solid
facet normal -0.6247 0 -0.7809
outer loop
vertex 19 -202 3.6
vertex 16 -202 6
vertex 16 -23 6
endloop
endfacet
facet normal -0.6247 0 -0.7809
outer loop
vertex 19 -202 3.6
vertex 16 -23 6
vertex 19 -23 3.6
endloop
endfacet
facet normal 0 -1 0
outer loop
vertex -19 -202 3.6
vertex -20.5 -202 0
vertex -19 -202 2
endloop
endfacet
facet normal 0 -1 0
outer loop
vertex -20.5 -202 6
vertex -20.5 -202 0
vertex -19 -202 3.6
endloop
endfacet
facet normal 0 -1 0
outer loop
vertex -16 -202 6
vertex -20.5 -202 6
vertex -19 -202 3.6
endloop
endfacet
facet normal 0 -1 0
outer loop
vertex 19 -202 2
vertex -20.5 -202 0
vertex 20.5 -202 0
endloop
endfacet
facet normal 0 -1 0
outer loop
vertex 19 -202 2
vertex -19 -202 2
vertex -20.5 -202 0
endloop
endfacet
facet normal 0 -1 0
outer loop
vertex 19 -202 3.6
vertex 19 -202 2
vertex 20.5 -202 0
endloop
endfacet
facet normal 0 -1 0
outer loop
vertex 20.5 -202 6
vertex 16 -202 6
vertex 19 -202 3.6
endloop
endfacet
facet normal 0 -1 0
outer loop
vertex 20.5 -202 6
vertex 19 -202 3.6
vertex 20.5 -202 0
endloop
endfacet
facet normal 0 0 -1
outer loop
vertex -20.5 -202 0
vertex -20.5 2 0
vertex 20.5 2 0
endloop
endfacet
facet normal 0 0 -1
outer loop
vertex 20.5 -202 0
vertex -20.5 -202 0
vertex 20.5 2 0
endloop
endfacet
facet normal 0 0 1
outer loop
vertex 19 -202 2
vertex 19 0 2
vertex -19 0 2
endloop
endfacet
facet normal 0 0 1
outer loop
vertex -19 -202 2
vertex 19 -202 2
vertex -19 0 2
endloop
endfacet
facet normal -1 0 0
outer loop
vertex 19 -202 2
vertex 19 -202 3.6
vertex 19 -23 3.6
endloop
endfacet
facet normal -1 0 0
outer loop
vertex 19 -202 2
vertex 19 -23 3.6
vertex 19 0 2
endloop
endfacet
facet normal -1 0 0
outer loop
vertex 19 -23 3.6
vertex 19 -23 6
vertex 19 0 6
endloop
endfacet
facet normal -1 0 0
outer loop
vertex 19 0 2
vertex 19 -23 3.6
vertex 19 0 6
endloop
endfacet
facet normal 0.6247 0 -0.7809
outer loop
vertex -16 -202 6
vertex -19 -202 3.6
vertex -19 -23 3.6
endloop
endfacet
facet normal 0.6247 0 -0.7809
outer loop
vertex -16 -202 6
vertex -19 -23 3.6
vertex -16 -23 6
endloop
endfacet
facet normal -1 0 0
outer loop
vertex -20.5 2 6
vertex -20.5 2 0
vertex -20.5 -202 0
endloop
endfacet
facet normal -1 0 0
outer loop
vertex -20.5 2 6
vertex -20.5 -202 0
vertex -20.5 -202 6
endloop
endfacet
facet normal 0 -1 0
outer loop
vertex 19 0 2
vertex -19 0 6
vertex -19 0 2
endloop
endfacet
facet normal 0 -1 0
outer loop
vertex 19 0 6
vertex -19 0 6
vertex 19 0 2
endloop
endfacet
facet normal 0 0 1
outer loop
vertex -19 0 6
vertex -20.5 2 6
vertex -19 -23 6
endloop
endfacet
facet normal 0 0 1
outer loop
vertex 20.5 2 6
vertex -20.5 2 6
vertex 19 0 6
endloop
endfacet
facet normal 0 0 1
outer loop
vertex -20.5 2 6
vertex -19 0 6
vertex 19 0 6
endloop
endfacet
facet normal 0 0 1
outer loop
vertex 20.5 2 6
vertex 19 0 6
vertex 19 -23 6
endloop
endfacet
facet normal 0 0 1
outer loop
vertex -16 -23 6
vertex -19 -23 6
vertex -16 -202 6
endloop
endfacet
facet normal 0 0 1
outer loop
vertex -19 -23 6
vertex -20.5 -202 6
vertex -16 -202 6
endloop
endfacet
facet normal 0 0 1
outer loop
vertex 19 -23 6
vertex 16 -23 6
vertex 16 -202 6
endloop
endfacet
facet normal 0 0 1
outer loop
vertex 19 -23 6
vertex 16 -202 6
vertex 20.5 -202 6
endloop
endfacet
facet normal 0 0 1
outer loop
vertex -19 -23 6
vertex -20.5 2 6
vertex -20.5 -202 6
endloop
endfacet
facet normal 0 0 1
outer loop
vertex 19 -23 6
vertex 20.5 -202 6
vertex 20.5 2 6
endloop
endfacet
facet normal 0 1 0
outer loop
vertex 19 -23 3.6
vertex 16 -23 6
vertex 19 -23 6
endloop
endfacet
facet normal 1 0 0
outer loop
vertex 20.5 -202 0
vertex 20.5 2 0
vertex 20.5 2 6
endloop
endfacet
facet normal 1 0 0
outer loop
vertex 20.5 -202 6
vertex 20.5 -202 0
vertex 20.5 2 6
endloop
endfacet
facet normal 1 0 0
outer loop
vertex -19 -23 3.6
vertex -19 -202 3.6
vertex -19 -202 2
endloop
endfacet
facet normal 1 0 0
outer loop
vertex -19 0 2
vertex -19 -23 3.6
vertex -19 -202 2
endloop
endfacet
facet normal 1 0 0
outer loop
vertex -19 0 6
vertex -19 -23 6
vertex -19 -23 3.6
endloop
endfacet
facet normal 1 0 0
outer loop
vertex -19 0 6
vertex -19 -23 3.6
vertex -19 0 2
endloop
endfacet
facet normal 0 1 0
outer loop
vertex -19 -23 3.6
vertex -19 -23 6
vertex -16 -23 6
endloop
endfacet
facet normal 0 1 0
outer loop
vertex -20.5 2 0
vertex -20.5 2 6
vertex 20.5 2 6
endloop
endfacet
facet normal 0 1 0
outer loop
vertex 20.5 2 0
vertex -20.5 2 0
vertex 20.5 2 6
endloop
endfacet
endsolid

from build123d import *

# Parameters (mm, degrees)
F1_DEPTH = 202
F2_W     = 41
F2_H     = 6
F3_DEPTH = 2
F5_W     = 38
F5_H     = 23
F6_DEPTH = 4


with BuildPart() as f1:
    # F0 (on Front) → F1 (new body)
    with BuildSketch(Plane.XZ):
        Polygon((-20.5, 6), (-20.5, 0), (20.5, 0), (20.5, 6), (16, 6), (19, 3.6), (19, 2), (-19, 2), (-19, 3.6), (-16, 6), align=None)
    extrude(amount=F1_DEPTH)

    # F2 (on Front) → F3 (join)
    with BuildSketch(Plane.XZ):
        with Locations((0, 3)):
            Rectangle(F2_W, F2_H)
    extrude(amount=-F3_DEPTH)

    # F5 (on offset) → F6 (cut)
    with BuildSketch(Plane.XY.offset(6)):
        with Locations((0, -11.5)):
            Rectangle(F5_W, F5_H)
    extrude(amount=-F6_DEPTH, mode=Mode.SUBTRACT)


solid = f1.part
